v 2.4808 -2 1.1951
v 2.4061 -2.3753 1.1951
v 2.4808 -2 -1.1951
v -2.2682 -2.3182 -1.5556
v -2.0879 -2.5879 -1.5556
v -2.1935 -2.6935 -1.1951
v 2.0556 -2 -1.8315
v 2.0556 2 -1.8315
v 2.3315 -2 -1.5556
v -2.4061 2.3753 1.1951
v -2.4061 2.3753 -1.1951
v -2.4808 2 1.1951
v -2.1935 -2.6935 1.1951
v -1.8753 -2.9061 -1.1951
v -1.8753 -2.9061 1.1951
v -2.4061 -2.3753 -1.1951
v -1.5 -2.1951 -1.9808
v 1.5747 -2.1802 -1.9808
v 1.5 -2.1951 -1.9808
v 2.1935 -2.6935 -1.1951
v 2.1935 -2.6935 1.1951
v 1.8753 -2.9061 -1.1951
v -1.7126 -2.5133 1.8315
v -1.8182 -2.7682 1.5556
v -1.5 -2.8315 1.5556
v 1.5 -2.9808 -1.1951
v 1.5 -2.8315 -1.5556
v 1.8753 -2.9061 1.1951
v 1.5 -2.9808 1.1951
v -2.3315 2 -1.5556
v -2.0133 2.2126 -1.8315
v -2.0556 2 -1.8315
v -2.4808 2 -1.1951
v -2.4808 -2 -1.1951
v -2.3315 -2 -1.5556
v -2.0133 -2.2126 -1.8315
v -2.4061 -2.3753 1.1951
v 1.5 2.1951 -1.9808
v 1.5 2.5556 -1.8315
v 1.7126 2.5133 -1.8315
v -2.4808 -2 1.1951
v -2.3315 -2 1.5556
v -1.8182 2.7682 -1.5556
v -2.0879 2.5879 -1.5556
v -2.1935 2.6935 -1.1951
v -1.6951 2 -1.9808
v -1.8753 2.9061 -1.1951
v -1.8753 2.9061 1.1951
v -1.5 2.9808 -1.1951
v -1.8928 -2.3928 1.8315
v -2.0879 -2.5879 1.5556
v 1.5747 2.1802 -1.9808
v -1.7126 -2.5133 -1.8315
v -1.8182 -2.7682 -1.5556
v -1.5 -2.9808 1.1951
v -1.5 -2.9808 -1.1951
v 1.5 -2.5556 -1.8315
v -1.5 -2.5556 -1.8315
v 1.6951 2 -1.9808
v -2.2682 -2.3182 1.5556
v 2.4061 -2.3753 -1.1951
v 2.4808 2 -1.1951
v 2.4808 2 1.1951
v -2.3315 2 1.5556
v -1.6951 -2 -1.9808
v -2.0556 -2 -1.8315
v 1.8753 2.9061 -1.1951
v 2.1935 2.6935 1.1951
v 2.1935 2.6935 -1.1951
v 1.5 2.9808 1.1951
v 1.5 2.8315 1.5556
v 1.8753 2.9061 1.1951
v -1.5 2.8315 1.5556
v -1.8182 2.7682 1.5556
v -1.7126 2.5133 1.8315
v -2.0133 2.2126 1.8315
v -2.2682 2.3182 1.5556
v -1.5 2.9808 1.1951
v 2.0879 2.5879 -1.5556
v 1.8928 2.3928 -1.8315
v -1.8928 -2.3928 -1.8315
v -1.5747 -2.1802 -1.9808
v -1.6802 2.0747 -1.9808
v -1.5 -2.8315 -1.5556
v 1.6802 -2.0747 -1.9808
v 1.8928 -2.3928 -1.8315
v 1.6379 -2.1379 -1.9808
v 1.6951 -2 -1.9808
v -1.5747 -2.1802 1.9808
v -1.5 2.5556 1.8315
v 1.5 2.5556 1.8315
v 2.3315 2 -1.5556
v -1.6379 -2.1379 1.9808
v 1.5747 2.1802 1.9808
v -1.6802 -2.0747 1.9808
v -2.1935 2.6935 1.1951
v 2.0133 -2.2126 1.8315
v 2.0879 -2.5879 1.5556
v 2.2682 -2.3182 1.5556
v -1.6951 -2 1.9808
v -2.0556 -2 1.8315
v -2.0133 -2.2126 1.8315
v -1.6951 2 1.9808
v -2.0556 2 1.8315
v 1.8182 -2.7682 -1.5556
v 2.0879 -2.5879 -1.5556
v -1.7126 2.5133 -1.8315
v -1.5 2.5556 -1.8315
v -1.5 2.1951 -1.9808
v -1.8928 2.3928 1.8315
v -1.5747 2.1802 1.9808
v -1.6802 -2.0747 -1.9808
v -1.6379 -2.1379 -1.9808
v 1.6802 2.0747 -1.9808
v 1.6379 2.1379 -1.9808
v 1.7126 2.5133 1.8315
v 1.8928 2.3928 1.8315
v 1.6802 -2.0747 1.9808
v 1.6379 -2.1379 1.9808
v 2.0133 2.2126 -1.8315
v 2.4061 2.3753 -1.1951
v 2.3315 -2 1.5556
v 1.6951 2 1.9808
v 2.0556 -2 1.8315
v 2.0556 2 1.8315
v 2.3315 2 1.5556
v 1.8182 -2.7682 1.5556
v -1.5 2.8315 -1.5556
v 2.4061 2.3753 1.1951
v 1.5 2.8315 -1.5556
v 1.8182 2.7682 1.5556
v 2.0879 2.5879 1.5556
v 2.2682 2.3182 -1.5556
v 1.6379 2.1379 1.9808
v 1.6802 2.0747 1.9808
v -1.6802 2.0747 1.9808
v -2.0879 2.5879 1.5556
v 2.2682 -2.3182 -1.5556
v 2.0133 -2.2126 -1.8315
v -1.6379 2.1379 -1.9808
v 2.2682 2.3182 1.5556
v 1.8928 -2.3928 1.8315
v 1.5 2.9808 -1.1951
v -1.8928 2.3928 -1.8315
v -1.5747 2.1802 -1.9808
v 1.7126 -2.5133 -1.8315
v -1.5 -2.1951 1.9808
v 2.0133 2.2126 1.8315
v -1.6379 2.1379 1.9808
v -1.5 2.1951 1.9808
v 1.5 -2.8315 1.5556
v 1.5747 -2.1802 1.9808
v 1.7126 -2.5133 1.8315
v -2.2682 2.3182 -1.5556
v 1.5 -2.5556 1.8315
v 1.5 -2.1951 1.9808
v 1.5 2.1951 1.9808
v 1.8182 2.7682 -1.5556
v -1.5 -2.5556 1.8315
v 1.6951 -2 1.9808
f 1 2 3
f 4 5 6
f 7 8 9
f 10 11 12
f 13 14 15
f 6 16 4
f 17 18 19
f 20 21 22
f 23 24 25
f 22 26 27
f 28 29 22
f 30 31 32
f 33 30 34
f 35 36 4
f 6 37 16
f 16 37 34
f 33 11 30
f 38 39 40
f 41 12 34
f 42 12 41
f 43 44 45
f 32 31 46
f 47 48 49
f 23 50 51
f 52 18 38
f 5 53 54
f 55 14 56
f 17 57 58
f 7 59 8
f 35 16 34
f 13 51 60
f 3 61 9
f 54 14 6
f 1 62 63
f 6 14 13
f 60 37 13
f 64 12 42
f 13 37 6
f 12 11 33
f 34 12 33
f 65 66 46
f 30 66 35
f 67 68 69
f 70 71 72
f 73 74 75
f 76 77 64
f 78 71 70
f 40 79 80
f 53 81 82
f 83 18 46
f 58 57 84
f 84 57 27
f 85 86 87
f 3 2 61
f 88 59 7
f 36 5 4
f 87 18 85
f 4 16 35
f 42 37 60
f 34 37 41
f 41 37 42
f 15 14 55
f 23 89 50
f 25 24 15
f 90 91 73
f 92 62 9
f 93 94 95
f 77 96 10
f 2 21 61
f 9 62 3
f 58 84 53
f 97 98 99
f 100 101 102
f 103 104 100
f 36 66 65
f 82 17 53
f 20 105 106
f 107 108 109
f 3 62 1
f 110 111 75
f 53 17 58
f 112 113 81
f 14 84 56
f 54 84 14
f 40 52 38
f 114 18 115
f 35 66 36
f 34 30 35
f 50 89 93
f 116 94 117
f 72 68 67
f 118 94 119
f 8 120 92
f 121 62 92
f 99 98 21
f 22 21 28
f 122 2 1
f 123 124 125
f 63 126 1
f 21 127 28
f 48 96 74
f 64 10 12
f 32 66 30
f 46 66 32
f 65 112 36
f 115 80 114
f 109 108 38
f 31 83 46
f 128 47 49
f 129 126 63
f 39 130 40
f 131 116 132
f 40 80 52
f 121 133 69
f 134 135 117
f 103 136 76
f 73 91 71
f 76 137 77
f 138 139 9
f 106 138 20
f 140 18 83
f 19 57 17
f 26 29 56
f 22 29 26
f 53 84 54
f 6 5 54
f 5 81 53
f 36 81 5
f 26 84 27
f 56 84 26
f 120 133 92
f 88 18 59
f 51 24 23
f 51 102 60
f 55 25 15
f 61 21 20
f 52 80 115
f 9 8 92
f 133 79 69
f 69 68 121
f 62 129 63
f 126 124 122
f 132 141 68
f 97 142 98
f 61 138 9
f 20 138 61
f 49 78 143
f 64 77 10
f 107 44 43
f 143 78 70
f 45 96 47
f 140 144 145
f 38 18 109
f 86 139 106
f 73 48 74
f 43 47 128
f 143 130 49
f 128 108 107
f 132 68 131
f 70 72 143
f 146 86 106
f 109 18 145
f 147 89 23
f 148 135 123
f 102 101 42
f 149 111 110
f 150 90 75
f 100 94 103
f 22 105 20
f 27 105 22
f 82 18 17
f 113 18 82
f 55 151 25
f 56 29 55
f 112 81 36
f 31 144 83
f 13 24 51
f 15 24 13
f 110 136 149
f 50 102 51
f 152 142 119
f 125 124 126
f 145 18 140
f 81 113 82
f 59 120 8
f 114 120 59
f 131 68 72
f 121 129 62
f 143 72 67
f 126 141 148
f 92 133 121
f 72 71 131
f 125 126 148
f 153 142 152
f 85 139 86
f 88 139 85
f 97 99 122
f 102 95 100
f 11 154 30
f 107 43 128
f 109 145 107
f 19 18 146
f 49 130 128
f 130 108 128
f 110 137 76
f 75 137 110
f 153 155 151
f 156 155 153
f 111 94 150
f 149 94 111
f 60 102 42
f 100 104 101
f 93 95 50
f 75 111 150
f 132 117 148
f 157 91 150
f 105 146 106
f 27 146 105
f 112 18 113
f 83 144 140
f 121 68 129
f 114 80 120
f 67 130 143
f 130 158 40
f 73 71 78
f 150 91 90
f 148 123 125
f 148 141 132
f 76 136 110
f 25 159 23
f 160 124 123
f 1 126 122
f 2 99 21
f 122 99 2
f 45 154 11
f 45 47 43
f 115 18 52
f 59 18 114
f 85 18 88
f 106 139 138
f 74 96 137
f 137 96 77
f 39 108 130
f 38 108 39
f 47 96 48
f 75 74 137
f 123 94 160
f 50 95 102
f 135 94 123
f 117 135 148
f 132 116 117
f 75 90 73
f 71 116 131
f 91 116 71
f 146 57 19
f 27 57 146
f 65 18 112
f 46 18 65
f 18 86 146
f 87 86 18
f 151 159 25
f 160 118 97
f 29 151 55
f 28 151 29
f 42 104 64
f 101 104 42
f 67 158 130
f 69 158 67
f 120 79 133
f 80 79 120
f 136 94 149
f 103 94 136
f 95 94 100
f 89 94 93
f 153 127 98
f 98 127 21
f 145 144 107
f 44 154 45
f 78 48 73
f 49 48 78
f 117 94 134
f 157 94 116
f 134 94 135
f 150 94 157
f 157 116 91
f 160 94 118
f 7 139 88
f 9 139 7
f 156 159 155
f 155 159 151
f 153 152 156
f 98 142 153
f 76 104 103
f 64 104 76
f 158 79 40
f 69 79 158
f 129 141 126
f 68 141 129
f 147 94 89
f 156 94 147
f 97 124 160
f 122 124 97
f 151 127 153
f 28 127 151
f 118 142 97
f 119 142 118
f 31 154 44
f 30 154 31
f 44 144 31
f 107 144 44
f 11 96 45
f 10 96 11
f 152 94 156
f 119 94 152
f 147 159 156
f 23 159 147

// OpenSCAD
hull() {
	union() {
		translate(v = [-1.5, -2.0, -1.0]) {
			sphere($fn = 16, r = 1);
		}
		translate(v = [-1.5, -2.0, 1.0]) {
			sphere($fn = 16, r = 1);
		}
		translate(v = [-1.5, 2.0, -1.0]) {
			sphere($fn = 16, r = 1);
		}
		translate(v = [-1.5, 2.0, 1.0]) {
			sphere($fn = 16, r = 1);
		}
		translate(v = [1.5, -2.0, -1.0]) {
			sphere($fn = 16, r = 1);
		}
		translate(v = [1.5, -2.0, 1.0]) {
			sphere($fn = 16, r = 1);
		}
		translate(v = [1.5, 2.0, -1.0]) {
			sphere($fn = 16, r = 1);
		}
		translate(v = [1.5, 2.0, 1.0]) {
			sphere($fn = 16, r = 1);
		}
	}
}
